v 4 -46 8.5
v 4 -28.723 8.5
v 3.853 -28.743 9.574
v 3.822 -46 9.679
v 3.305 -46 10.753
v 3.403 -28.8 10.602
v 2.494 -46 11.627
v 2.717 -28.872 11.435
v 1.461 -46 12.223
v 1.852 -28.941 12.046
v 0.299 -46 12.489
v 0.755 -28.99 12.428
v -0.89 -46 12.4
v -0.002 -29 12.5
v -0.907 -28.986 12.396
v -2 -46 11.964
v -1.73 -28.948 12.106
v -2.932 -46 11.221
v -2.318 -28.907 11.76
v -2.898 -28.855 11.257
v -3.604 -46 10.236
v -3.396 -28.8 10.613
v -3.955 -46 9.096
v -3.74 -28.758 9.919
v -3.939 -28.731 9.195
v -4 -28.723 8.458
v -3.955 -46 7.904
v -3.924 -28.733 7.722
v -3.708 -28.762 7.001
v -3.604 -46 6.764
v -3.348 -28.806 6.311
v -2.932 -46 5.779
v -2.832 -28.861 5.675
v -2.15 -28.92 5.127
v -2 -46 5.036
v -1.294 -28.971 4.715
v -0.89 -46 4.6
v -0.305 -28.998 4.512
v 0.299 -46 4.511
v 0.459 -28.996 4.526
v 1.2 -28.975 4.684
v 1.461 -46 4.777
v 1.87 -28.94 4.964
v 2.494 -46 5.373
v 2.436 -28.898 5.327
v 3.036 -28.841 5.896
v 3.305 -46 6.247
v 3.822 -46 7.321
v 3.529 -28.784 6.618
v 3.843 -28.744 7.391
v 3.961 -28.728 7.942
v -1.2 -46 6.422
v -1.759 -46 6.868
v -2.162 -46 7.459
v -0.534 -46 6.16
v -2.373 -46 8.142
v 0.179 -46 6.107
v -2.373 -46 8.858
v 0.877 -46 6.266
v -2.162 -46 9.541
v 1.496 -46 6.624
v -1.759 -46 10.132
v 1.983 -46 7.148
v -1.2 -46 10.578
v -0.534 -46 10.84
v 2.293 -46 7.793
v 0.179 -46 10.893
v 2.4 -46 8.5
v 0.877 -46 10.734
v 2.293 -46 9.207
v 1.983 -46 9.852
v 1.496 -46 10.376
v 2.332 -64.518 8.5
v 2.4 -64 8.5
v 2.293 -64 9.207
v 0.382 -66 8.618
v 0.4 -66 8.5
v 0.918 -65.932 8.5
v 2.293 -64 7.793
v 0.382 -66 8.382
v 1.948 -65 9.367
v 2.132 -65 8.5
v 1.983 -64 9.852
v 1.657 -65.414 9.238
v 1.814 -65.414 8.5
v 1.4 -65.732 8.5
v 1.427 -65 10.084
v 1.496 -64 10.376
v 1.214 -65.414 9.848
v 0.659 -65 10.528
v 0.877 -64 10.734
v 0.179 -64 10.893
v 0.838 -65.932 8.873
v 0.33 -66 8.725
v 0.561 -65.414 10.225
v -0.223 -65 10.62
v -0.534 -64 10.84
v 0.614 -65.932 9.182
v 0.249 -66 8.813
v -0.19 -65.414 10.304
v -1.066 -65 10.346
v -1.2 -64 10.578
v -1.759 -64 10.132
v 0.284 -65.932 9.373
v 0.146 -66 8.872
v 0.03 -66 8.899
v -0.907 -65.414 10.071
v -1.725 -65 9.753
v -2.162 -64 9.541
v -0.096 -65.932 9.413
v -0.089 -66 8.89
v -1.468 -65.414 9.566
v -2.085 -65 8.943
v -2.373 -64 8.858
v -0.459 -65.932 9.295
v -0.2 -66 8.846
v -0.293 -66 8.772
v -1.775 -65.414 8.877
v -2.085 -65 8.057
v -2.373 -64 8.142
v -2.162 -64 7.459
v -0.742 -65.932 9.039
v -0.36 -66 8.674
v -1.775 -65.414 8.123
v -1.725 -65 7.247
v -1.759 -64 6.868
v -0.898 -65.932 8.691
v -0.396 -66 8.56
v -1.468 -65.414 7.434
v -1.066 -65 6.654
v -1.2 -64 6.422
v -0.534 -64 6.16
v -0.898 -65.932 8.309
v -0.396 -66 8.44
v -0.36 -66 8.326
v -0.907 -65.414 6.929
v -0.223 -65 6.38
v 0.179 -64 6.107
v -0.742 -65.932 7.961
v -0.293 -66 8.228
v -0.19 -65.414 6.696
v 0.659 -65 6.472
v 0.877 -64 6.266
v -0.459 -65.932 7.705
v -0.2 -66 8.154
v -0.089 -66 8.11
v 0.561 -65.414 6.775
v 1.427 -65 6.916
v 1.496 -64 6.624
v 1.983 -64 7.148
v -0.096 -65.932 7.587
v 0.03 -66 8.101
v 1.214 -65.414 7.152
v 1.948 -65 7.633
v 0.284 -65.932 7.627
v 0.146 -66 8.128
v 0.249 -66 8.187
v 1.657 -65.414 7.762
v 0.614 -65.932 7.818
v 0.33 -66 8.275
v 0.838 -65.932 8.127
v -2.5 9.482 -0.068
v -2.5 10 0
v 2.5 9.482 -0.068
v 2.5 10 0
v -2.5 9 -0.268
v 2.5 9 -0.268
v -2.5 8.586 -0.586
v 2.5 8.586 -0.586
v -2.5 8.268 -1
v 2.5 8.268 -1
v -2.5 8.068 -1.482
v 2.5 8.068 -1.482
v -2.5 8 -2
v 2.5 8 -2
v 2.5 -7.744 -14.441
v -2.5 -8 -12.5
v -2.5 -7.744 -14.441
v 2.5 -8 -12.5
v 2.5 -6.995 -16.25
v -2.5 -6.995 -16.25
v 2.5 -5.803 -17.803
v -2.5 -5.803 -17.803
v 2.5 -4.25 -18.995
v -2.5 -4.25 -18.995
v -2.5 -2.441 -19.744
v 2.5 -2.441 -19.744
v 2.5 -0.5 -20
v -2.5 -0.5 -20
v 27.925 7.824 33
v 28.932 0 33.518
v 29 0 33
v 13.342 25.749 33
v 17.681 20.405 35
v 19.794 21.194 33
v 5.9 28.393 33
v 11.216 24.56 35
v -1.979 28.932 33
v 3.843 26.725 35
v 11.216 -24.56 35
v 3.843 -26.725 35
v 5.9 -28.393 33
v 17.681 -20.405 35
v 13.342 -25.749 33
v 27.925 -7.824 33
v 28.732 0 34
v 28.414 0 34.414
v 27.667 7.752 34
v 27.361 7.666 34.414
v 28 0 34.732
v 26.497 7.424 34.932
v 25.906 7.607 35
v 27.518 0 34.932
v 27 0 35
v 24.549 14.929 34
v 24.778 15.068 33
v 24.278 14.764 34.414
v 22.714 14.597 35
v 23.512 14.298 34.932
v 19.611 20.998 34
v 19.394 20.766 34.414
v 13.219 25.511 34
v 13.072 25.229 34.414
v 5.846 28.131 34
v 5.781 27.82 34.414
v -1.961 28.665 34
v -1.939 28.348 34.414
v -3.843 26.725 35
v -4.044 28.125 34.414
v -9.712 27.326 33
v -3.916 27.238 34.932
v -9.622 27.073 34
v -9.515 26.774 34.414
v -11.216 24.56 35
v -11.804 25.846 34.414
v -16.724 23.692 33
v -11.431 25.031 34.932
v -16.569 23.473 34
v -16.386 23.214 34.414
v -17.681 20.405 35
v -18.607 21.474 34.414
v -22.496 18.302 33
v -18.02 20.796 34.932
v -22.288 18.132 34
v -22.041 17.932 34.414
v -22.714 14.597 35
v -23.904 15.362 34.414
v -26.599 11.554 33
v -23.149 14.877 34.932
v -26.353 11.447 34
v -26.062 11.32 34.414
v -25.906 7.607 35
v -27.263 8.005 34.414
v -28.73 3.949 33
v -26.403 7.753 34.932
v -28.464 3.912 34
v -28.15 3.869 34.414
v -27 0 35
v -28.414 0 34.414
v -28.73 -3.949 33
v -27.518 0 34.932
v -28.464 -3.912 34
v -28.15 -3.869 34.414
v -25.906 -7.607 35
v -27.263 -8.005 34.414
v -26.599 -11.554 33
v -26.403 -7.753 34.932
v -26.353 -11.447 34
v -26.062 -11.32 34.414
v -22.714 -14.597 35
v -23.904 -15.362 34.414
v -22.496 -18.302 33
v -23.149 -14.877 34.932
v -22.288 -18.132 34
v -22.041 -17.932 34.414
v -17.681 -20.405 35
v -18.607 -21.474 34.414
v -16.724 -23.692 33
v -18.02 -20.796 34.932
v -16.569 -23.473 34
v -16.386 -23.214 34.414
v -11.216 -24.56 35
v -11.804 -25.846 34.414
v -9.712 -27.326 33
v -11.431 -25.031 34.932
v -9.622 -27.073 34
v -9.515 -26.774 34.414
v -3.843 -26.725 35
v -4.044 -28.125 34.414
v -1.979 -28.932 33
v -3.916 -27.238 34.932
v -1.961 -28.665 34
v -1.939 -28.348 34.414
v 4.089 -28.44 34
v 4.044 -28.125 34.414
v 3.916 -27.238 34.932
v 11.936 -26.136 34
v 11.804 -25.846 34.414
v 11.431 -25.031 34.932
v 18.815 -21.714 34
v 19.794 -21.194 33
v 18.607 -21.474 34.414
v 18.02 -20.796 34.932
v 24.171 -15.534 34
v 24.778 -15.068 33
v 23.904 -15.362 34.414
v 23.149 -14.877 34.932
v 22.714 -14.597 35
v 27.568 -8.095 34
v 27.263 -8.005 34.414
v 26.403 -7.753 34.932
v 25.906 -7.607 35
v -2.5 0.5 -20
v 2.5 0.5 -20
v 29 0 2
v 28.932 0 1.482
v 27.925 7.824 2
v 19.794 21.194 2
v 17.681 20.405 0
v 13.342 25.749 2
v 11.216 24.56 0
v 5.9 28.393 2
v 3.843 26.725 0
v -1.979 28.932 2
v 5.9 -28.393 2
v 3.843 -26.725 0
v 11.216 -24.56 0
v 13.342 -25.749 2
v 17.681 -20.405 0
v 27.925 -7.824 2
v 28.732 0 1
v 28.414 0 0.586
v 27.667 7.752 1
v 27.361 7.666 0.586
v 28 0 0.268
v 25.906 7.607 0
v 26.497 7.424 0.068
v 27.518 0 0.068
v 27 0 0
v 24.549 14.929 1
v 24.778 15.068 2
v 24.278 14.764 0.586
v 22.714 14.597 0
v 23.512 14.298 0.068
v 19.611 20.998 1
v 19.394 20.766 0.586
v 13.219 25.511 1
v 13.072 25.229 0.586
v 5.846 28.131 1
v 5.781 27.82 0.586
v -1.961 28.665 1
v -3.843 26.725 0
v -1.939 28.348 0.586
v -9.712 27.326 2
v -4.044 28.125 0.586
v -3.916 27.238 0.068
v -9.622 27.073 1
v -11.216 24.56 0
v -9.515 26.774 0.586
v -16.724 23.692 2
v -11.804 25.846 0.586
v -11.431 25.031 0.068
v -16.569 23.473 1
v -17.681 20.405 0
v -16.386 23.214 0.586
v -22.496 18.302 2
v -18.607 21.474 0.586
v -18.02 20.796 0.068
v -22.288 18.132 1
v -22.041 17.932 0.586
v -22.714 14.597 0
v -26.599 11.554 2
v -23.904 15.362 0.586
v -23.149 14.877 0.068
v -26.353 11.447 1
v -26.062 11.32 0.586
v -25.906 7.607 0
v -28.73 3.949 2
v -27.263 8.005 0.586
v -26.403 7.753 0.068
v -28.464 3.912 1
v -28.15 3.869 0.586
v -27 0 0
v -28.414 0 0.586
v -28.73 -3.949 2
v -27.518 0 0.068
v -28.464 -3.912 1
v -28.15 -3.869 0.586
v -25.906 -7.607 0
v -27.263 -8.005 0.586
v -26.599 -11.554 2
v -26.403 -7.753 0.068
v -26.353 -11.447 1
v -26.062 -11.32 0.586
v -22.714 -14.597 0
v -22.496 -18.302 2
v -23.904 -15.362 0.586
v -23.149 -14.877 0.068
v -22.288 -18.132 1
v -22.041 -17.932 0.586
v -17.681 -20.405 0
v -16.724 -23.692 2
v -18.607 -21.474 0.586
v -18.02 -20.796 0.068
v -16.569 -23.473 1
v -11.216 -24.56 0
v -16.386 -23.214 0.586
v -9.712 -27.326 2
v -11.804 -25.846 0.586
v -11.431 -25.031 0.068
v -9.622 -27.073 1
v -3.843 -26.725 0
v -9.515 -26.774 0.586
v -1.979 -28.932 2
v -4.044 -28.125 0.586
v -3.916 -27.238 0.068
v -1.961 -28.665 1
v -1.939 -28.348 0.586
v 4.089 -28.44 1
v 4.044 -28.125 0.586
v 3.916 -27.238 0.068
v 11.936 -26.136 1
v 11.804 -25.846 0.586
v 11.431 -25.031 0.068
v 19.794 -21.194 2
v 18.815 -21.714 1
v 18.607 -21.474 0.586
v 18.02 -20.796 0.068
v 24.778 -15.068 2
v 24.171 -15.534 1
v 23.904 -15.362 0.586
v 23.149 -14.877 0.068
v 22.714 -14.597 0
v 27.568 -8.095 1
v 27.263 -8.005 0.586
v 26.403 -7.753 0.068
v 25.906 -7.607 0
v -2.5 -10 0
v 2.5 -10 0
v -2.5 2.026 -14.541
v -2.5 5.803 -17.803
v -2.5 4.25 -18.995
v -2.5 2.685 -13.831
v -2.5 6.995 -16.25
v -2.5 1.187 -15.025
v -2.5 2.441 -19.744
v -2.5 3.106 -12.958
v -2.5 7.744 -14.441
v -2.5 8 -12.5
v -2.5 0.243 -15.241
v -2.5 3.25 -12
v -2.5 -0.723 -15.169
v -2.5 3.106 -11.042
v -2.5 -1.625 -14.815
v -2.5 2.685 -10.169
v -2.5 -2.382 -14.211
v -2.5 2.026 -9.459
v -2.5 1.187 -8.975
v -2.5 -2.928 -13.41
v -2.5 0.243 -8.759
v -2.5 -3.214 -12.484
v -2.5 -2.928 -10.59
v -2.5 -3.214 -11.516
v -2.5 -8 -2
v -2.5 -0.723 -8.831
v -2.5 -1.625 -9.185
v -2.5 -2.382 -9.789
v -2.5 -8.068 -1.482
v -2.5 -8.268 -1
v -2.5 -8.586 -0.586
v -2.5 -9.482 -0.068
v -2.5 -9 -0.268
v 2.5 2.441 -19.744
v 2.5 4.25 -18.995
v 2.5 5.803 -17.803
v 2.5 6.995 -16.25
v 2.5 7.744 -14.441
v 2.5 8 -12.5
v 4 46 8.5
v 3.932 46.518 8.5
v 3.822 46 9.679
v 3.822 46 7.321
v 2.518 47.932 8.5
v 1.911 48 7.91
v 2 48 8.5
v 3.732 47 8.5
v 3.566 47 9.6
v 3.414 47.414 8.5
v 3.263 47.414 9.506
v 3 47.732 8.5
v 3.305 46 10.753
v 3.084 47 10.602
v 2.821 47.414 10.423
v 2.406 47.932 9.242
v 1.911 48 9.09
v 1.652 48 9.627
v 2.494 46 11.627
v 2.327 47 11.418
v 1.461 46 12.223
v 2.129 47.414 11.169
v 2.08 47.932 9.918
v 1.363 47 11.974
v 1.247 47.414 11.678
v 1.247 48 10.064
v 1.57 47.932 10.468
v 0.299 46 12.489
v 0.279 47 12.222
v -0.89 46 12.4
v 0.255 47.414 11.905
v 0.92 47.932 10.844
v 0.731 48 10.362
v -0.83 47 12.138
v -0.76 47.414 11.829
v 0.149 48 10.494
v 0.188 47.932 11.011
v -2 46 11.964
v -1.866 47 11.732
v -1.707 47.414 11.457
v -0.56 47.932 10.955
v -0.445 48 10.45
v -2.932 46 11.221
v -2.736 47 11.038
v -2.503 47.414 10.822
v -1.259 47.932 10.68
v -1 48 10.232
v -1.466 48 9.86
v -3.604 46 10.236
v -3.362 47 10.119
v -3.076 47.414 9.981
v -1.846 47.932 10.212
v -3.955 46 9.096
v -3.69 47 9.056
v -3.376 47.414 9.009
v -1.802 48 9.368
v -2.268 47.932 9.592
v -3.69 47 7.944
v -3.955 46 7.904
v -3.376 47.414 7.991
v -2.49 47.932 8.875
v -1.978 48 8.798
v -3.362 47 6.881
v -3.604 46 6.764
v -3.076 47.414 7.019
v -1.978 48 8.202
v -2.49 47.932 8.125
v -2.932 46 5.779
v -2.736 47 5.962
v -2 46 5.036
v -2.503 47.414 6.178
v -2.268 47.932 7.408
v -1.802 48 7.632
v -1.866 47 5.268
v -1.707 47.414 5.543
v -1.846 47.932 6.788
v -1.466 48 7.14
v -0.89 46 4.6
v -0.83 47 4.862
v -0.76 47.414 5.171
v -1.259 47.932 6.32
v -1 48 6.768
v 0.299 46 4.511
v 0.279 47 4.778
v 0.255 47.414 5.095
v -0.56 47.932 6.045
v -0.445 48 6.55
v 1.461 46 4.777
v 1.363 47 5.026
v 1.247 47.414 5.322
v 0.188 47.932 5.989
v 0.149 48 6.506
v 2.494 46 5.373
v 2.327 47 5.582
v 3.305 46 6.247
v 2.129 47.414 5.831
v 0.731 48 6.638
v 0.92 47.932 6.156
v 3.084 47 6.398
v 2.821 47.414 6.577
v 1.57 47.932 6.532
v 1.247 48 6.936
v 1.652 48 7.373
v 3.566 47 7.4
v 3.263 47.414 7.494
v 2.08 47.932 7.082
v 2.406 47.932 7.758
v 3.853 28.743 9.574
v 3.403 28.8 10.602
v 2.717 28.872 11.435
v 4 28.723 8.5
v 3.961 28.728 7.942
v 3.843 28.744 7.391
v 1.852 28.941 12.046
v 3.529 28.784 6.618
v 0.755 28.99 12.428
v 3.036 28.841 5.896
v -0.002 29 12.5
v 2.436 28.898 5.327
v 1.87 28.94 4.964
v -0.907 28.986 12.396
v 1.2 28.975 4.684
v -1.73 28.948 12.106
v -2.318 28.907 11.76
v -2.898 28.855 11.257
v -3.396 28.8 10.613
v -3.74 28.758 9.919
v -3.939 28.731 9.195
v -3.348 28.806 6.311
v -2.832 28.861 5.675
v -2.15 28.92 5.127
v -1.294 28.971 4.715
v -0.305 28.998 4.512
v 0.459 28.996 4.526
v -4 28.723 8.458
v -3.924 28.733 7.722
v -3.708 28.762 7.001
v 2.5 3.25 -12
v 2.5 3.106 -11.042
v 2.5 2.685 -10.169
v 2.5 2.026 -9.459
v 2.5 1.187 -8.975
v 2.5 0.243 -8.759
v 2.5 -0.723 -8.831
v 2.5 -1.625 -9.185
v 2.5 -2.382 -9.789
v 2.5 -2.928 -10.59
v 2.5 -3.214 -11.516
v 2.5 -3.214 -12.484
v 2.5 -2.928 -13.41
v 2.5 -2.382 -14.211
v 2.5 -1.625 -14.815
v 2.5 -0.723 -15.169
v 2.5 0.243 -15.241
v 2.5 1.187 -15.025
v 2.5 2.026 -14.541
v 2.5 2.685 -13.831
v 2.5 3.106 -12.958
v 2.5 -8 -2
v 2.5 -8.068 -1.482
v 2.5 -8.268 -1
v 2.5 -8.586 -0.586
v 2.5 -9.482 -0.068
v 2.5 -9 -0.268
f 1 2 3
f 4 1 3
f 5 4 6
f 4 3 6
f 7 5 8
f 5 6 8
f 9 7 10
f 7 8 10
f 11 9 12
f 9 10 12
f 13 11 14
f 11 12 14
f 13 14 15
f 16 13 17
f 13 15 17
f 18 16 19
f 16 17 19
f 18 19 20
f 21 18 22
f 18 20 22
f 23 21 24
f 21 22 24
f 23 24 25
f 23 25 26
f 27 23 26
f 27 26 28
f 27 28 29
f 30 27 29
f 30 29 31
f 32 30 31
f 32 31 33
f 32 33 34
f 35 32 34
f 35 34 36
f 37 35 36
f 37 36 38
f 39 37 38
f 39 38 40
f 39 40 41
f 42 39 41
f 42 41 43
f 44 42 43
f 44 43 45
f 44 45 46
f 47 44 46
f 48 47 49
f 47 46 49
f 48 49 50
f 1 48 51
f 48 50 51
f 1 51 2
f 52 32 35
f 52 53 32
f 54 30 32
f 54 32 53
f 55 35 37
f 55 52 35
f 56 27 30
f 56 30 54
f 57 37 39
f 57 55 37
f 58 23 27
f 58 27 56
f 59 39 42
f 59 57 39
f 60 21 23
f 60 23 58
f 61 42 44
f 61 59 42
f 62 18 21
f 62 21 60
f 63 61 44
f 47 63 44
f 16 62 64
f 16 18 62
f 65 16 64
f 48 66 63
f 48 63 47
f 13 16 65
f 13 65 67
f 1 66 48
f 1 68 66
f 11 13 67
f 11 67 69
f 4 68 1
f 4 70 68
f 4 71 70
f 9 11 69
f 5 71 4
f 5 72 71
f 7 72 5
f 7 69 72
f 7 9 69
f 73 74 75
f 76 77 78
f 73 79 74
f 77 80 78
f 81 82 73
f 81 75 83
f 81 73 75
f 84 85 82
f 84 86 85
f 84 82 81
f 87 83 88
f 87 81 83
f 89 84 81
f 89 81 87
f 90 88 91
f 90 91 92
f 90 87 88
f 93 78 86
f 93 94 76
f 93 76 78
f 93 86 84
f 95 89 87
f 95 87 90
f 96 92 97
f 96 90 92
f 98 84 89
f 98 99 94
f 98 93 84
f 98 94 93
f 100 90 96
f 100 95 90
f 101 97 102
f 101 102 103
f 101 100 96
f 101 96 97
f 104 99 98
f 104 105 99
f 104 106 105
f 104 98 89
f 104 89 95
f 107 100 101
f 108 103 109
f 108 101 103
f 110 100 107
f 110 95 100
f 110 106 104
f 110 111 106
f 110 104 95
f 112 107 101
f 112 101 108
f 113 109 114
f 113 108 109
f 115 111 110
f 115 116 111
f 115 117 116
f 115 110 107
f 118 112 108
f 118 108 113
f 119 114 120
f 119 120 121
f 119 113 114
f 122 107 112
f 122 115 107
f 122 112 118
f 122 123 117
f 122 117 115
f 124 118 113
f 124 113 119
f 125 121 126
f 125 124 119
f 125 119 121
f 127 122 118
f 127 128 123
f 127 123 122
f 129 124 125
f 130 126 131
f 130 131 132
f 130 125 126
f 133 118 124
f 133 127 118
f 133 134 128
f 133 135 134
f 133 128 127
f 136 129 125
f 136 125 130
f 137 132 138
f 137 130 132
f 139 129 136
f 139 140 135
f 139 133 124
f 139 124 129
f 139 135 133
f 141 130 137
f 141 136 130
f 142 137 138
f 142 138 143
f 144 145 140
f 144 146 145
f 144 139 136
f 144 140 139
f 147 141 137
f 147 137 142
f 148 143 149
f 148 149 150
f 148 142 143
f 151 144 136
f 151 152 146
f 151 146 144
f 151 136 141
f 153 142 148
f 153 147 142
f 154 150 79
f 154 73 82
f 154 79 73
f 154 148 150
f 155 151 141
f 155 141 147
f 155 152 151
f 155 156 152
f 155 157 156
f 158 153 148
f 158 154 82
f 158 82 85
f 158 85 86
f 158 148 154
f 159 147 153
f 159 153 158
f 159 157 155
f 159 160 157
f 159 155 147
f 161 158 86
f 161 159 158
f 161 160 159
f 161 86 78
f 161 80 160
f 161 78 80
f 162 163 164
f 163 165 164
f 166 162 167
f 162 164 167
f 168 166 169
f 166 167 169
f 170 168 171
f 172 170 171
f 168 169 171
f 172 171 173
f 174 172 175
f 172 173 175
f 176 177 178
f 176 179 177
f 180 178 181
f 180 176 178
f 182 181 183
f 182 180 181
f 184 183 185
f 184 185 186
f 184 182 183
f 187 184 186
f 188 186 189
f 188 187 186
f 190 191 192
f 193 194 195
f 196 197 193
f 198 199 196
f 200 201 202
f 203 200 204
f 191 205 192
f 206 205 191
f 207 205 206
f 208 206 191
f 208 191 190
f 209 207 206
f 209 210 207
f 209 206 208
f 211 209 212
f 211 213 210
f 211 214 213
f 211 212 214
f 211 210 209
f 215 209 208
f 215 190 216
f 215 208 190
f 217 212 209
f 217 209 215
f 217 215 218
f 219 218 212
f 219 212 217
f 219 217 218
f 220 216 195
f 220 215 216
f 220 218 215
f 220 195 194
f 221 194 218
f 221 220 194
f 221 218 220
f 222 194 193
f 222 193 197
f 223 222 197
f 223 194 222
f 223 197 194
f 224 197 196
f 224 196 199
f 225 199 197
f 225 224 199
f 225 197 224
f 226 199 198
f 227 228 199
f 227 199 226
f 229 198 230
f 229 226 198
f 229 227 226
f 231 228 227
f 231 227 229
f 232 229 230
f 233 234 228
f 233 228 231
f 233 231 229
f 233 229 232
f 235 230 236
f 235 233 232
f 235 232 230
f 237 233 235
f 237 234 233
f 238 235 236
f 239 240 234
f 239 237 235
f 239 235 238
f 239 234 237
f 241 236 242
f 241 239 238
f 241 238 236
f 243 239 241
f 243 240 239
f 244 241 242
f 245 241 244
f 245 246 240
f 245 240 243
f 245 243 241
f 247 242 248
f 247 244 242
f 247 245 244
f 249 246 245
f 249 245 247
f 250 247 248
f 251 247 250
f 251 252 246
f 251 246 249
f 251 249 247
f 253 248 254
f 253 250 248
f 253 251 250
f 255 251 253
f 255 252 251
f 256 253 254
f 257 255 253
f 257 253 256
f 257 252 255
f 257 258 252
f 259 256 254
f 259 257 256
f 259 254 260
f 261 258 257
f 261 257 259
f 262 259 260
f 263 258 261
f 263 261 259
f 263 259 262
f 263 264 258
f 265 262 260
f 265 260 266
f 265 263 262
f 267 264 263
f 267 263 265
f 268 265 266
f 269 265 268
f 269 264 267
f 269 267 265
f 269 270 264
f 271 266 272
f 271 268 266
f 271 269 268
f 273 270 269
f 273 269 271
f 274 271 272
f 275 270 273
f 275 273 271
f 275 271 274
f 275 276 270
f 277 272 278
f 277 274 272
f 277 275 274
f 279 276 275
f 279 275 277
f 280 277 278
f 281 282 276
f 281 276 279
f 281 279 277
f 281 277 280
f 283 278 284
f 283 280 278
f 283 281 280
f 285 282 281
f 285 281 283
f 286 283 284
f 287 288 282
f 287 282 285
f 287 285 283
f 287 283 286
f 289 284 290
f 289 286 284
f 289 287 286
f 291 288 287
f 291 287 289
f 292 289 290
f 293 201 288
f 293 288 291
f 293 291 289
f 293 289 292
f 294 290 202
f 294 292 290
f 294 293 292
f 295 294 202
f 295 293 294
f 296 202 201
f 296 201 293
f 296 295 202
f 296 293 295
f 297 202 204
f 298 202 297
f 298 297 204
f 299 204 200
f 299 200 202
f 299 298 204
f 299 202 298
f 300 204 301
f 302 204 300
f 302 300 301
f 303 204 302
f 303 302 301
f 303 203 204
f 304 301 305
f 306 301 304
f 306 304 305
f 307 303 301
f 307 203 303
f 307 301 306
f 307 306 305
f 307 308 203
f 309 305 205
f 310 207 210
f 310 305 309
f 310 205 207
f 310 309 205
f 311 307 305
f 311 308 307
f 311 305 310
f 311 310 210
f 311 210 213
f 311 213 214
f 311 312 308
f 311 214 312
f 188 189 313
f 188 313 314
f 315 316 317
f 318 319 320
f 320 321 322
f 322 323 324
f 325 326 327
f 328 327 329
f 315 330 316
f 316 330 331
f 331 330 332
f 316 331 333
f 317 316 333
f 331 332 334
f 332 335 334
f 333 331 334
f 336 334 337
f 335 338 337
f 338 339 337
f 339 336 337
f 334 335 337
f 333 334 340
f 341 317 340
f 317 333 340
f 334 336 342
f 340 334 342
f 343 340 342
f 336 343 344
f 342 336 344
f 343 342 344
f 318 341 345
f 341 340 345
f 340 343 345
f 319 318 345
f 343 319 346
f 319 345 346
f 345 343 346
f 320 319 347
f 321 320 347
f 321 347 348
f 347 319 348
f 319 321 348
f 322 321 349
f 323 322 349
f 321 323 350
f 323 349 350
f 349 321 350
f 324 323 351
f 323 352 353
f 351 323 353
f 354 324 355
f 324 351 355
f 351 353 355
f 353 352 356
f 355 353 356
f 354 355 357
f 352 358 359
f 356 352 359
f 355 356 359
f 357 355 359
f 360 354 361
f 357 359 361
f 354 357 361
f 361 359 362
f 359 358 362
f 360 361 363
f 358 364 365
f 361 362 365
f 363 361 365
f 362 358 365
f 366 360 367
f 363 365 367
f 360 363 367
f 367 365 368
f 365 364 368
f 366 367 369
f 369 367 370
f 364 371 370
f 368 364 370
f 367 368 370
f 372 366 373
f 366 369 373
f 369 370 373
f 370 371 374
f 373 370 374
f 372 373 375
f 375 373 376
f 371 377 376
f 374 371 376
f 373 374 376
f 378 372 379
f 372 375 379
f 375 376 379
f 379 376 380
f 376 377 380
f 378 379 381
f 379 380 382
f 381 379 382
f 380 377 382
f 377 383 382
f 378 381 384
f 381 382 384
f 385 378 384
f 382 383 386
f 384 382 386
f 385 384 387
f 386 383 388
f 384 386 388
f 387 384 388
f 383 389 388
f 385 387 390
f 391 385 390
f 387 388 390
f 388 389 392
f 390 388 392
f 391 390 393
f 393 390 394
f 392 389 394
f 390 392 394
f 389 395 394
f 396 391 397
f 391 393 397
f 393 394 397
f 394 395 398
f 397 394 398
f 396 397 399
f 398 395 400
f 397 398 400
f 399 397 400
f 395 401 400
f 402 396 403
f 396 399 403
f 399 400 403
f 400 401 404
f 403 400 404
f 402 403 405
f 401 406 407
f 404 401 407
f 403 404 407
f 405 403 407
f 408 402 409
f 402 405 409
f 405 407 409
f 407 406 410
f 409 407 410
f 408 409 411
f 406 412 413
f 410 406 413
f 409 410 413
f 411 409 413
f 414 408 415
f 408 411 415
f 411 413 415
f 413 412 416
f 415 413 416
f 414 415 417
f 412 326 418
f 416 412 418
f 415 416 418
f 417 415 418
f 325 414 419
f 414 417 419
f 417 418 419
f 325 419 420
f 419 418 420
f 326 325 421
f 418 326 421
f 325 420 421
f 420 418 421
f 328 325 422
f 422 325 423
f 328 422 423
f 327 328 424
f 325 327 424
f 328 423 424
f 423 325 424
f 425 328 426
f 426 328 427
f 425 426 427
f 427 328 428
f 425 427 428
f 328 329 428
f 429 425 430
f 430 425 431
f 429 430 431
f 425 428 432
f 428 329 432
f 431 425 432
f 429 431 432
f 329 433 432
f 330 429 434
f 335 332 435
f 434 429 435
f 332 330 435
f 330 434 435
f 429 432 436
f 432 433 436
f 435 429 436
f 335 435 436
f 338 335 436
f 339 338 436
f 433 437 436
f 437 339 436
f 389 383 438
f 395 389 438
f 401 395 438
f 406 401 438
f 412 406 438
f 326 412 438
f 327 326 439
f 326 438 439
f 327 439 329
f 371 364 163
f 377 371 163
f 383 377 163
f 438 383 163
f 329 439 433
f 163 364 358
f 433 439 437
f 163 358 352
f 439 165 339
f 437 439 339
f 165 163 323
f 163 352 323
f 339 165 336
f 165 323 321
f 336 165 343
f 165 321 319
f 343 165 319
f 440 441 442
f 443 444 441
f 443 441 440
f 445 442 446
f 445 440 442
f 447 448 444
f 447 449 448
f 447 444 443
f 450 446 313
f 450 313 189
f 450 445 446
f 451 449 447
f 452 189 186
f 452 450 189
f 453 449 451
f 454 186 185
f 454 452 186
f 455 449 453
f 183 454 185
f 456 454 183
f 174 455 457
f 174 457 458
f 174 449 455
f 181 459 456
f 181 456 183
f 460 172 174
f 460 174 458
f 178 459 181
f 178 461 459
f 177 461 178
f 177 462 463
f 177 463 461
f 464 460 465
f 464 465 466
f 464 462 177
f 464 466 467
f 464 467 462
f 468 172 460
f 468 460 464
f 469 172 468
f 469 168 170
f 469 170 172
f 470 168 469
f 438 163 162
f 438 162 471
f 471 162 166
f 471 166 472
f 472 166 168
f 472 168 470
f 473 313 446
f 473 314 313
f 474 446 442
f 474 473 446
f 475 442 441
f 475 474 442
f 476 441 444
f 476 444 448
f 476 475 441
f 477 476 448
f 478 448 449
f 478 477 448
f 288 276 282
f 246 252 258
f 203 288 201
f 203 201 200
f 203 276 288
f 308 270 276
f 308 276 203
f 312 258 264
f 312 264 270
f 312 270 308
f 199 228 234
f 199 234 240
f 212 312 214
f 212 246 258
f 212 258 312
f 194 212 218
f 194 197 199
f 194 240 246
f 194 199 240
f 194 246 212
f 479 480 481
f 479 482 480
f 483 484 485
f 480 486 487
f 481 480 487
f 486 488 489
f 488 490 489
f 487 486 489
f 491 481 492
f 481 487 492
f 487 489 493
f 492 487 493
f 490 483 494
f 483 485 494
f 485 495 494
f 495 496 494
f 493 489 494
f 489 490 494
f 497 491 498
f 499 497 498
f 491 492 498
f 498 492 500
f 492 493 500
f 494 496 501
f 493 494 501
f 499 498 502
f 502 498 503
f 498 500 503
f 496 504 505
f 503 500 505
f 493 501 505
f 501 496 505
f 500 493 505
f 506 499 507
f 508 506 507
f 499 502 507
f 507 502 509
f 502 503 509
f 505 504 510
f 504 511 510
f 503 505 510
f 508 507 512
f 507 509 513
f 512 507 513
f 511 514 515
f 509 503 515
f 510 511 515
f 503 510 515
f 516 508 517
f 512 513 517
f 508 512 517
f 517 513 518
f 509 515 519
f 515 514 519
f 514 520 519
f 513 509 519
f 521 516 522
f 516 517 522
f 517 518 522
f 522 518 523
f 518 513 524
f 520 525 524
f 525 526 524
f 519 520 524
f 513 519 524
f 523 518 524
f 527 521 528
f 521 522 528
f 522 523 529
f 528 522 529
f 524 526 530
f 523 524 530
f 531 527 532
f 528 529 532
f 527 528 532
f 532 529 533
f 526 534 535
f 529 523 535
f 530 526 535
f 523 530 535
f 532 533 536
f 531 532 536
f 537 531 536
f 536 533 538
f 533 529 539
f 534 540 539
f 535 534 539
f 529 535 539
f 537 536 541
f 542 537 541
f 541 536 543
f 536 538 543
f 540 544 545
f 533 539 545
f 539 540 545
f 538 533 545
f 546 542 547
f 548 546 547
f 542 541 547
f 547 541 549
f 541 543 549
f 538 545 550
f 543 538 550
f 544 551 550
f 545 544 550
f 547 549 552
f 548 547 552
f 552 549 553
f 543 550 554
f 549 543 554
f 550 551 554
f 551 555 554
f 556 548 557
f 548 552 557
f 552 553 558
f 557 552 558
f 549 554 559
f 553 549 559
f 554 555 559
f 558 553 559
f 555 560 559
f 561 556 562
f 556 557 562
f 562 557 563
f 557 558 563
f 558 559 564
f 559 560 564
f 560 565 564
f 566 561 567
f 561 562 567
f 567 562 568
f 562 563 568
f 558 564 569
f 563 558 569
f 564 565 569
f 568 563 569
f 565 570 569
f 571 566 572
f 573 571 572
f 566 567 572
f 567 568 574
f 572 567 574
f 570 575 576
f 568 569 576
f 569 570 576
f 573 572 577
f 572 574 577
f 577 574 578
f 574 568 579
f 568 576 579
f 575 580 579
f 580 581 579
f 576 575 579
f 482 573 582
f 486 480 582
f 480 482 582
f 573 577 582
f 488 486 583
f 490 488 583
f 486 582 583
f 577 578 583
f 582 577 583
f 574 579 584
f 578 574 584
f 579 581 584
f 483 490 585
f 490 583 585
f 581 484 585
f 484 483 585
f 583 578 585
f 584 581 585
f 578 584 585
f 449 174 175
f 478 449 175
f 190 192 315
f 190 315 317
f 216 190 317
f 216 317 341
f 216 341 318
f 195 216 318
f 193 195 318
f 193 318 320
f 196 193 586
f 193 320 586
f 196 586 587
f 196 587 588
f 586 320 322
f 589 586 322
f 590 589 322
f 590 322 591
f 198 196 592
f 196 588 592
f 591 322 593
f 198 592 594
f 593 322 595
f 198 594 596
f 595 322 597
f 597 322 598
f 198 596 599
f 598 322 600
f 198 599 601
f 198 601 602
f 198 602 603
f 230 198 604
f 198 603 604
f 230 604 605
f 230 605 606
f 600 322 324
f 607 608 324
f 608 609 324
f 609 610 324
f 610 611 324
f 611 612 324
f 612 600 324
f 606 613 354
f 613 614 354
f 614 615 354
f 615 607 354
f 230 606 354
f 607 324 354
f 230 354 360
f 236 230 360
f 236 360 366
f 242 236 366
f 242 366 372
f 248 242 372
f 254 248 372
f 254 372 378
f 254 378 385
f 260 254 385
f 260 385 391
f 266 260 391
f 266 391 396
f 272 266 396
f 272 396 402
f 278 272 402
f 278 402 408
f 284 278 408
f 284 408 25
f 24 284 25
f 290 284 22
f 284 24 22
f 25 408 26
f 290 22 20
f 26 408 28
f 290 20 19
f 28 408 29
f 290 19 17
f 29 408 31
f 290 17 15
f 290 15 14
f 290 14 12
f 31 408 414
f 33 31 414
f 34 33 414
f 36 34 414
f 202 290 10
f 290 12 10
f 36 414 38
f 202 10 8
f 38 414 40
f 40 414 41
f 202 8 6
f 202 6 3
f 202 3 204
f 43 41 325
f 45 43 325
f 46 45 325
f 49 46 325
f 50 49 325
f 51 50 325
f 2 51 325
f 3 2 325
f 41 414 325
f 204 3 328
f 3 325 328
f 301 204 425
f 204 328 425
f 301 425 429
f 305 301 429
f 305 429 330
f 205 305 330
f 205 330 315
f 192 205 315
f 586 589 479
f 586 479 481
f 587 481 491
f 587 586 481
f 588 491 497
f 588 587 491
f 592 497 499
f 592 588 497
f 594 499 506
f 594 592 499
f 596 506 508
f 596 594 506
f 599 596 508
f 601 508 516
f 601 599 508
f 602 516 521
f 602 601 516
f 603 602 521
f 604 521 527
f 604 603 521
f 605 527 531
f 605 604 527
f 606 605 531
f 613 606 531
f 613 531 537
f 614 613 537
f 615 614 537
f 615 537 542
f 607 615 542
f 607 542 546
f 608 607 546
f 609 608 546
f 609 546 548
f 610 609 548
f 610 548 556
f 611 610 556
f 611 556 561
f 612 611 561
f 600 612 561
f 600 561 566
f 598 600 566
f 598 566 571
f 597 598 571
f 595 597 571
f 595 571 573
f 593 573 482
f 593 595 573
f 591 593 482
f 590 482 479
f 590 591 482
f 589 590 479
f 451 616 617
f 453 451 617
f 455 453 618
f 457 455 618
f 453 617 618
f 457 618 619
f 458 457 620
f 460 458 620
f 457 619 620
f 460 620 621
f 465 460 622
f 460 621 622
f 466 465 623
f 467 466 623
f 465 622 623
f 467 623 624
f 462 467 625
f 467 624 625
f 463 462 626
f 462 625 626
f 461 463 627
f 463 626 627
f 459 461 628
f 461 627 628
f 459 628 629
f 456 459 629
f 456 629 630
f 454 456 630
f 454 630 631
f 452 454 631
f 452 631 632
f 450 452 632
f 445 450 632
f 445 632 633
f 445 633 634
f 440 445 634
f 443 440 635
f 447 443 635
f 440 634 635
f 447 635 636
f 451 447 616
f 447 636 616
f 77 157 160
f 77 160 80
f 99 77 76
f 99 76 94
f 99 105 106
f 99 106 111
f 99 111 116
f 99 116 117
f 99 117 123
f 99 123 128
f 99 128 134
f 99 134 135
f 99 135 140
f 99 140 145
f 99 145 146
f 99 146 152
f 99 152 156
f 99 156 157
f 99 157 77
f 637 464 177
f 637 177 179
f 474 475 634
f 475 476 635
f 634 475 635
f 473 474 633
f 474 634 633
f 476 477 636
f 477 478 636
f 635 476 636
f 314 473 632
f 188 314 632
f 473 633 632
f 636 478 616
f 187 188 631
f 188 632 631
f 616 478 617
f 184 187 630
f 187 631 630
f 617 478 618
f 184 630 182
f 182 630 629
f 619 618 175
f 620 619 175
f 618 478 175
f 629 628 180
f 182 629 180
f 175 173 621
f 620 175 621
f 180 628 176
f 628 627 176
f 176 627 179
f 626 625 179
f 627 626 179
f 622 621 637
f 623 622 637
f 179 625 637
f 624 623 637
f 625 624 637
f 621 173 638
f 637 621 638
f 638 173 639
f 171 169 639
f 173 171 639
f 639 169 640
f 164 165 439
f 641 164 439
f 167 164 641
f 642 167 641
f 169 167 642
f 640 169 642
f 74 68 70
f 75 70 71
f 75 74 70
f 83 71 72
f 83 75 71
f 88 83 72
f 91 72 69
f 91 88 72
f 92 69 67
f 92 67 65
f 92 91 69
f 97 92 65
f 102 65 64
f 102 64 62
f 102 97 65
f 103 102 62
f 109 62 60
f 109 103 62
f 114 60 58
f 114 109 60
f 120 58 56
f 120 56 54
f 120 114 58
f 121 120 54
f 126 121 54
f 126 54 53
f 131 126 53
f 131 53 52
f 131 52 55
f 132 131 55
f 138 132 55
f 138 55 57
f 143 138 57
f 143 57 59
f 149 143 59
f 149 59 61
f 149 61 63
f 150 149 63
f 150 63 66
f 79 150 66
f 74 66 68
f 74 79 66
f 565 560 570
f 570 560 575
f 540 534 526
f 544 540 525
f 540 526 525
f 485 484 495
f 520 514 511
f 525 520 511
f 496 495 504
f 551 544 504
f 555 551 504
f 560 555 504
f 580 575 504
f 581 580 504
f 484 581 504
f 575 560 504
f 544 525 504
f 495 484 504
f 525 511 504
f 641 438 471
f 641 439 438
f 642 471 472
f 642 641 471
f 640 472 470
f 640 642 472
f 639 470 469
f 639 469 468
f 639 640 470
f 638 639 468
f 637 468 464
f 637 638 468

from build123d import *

# Parameters (mm, degrees)
SKETCH_R          = 29
PAD_DEPTH         = 35
SKETCH001_W       = 5
SKETCH001_H       = 16
PAD001_DEPTH      = 20
SKETCH002_R       = 4
PAD002_DEPTH      = 66
PAD002_DEPTH_BACK = 48
SKETCH003_R       = 4
SKETCH003_R_2     = 2.4
POCKET_DEPTH      = 20
SKETCH004_R       = 3.25
POCKET001_DEPTH   = 5
FILLET_R          = 2
FILLET001_R       = 7.5


with BuildPart() as part:
    # Sketch → Pad (new body)
    with BuildSketch(Plane.XY):
        Circle(SKETCH_R)
    extrude(amount=PAD_DEPTH)

    # Sketch001 (on Face2 of Pad) → Pad001 (join)
    with BuildSketch(Plane(origin=(0, 0, 0), x_dir=(1, 0, 0), z_dir=(0, 0, -1))):
        Rectangle(SKETCH001_W, SKETCH001_H)
    extrude(amount=PAD001_DEPTH)

    # Sketch002 → Pad002 (join, two sides)
    with BuildSketch(Plane.XZ) as pad002_sk:
        with Locations((0, 8.5)):
            Circle(SKETCH002_R)
    extrude(amount=PAD002_DEPTH)
    extrude(pad002_sk.sketch, amount=-PAD002_DEPTH_BACK)

    # Sketch003 (on Face12 of Pad002) → Pocket (cut)
    with BuildSketch(Plane.XZ.offset(66)):
        with Locations((0, 8.5)):
            Circle(SKETCH003_R)
        with Locations((0, 8.5)):
            Circle(SKETCH003_R_2, mode=Mode.SUBTRACT)
    extrude(amount=-POCKET_DEPTH, mode=Mode.SUBTRACT)

    # Sketch004 (on Face6 of Pocket) → Pocket001 (cut)
    with BuildSketch(Plane.YZ.offset(2.5)):
        with Locations((0, -12)):
            Circle(SKETCH004_R)
    extrude(amount=-POCKET001_DEPTH, mode=Mode.SUBTRACT)

    # Fillet
    fillet_edges = [part.edges().sort_by_distance(p)[0] for p in [
        (-2.4, -66, 8.5),
        (-29, 0, 35),
        (-29, 0, 0),
        (0, 8, 0),
        (0, -8, 0),
        (-4, 48, 8.5),
    ]]
    fillet(fillet_edges, radius=FILLET_R)

    # Fillet001
    fillet001_edges = [part.edges().sort_by_distance(p)[0] for p in [
        (0, -8, -20),
        (0, 8, -20),
    ]]
    fillet(fillet001_edges, radius=FILLET001_R)


solid = part.part
